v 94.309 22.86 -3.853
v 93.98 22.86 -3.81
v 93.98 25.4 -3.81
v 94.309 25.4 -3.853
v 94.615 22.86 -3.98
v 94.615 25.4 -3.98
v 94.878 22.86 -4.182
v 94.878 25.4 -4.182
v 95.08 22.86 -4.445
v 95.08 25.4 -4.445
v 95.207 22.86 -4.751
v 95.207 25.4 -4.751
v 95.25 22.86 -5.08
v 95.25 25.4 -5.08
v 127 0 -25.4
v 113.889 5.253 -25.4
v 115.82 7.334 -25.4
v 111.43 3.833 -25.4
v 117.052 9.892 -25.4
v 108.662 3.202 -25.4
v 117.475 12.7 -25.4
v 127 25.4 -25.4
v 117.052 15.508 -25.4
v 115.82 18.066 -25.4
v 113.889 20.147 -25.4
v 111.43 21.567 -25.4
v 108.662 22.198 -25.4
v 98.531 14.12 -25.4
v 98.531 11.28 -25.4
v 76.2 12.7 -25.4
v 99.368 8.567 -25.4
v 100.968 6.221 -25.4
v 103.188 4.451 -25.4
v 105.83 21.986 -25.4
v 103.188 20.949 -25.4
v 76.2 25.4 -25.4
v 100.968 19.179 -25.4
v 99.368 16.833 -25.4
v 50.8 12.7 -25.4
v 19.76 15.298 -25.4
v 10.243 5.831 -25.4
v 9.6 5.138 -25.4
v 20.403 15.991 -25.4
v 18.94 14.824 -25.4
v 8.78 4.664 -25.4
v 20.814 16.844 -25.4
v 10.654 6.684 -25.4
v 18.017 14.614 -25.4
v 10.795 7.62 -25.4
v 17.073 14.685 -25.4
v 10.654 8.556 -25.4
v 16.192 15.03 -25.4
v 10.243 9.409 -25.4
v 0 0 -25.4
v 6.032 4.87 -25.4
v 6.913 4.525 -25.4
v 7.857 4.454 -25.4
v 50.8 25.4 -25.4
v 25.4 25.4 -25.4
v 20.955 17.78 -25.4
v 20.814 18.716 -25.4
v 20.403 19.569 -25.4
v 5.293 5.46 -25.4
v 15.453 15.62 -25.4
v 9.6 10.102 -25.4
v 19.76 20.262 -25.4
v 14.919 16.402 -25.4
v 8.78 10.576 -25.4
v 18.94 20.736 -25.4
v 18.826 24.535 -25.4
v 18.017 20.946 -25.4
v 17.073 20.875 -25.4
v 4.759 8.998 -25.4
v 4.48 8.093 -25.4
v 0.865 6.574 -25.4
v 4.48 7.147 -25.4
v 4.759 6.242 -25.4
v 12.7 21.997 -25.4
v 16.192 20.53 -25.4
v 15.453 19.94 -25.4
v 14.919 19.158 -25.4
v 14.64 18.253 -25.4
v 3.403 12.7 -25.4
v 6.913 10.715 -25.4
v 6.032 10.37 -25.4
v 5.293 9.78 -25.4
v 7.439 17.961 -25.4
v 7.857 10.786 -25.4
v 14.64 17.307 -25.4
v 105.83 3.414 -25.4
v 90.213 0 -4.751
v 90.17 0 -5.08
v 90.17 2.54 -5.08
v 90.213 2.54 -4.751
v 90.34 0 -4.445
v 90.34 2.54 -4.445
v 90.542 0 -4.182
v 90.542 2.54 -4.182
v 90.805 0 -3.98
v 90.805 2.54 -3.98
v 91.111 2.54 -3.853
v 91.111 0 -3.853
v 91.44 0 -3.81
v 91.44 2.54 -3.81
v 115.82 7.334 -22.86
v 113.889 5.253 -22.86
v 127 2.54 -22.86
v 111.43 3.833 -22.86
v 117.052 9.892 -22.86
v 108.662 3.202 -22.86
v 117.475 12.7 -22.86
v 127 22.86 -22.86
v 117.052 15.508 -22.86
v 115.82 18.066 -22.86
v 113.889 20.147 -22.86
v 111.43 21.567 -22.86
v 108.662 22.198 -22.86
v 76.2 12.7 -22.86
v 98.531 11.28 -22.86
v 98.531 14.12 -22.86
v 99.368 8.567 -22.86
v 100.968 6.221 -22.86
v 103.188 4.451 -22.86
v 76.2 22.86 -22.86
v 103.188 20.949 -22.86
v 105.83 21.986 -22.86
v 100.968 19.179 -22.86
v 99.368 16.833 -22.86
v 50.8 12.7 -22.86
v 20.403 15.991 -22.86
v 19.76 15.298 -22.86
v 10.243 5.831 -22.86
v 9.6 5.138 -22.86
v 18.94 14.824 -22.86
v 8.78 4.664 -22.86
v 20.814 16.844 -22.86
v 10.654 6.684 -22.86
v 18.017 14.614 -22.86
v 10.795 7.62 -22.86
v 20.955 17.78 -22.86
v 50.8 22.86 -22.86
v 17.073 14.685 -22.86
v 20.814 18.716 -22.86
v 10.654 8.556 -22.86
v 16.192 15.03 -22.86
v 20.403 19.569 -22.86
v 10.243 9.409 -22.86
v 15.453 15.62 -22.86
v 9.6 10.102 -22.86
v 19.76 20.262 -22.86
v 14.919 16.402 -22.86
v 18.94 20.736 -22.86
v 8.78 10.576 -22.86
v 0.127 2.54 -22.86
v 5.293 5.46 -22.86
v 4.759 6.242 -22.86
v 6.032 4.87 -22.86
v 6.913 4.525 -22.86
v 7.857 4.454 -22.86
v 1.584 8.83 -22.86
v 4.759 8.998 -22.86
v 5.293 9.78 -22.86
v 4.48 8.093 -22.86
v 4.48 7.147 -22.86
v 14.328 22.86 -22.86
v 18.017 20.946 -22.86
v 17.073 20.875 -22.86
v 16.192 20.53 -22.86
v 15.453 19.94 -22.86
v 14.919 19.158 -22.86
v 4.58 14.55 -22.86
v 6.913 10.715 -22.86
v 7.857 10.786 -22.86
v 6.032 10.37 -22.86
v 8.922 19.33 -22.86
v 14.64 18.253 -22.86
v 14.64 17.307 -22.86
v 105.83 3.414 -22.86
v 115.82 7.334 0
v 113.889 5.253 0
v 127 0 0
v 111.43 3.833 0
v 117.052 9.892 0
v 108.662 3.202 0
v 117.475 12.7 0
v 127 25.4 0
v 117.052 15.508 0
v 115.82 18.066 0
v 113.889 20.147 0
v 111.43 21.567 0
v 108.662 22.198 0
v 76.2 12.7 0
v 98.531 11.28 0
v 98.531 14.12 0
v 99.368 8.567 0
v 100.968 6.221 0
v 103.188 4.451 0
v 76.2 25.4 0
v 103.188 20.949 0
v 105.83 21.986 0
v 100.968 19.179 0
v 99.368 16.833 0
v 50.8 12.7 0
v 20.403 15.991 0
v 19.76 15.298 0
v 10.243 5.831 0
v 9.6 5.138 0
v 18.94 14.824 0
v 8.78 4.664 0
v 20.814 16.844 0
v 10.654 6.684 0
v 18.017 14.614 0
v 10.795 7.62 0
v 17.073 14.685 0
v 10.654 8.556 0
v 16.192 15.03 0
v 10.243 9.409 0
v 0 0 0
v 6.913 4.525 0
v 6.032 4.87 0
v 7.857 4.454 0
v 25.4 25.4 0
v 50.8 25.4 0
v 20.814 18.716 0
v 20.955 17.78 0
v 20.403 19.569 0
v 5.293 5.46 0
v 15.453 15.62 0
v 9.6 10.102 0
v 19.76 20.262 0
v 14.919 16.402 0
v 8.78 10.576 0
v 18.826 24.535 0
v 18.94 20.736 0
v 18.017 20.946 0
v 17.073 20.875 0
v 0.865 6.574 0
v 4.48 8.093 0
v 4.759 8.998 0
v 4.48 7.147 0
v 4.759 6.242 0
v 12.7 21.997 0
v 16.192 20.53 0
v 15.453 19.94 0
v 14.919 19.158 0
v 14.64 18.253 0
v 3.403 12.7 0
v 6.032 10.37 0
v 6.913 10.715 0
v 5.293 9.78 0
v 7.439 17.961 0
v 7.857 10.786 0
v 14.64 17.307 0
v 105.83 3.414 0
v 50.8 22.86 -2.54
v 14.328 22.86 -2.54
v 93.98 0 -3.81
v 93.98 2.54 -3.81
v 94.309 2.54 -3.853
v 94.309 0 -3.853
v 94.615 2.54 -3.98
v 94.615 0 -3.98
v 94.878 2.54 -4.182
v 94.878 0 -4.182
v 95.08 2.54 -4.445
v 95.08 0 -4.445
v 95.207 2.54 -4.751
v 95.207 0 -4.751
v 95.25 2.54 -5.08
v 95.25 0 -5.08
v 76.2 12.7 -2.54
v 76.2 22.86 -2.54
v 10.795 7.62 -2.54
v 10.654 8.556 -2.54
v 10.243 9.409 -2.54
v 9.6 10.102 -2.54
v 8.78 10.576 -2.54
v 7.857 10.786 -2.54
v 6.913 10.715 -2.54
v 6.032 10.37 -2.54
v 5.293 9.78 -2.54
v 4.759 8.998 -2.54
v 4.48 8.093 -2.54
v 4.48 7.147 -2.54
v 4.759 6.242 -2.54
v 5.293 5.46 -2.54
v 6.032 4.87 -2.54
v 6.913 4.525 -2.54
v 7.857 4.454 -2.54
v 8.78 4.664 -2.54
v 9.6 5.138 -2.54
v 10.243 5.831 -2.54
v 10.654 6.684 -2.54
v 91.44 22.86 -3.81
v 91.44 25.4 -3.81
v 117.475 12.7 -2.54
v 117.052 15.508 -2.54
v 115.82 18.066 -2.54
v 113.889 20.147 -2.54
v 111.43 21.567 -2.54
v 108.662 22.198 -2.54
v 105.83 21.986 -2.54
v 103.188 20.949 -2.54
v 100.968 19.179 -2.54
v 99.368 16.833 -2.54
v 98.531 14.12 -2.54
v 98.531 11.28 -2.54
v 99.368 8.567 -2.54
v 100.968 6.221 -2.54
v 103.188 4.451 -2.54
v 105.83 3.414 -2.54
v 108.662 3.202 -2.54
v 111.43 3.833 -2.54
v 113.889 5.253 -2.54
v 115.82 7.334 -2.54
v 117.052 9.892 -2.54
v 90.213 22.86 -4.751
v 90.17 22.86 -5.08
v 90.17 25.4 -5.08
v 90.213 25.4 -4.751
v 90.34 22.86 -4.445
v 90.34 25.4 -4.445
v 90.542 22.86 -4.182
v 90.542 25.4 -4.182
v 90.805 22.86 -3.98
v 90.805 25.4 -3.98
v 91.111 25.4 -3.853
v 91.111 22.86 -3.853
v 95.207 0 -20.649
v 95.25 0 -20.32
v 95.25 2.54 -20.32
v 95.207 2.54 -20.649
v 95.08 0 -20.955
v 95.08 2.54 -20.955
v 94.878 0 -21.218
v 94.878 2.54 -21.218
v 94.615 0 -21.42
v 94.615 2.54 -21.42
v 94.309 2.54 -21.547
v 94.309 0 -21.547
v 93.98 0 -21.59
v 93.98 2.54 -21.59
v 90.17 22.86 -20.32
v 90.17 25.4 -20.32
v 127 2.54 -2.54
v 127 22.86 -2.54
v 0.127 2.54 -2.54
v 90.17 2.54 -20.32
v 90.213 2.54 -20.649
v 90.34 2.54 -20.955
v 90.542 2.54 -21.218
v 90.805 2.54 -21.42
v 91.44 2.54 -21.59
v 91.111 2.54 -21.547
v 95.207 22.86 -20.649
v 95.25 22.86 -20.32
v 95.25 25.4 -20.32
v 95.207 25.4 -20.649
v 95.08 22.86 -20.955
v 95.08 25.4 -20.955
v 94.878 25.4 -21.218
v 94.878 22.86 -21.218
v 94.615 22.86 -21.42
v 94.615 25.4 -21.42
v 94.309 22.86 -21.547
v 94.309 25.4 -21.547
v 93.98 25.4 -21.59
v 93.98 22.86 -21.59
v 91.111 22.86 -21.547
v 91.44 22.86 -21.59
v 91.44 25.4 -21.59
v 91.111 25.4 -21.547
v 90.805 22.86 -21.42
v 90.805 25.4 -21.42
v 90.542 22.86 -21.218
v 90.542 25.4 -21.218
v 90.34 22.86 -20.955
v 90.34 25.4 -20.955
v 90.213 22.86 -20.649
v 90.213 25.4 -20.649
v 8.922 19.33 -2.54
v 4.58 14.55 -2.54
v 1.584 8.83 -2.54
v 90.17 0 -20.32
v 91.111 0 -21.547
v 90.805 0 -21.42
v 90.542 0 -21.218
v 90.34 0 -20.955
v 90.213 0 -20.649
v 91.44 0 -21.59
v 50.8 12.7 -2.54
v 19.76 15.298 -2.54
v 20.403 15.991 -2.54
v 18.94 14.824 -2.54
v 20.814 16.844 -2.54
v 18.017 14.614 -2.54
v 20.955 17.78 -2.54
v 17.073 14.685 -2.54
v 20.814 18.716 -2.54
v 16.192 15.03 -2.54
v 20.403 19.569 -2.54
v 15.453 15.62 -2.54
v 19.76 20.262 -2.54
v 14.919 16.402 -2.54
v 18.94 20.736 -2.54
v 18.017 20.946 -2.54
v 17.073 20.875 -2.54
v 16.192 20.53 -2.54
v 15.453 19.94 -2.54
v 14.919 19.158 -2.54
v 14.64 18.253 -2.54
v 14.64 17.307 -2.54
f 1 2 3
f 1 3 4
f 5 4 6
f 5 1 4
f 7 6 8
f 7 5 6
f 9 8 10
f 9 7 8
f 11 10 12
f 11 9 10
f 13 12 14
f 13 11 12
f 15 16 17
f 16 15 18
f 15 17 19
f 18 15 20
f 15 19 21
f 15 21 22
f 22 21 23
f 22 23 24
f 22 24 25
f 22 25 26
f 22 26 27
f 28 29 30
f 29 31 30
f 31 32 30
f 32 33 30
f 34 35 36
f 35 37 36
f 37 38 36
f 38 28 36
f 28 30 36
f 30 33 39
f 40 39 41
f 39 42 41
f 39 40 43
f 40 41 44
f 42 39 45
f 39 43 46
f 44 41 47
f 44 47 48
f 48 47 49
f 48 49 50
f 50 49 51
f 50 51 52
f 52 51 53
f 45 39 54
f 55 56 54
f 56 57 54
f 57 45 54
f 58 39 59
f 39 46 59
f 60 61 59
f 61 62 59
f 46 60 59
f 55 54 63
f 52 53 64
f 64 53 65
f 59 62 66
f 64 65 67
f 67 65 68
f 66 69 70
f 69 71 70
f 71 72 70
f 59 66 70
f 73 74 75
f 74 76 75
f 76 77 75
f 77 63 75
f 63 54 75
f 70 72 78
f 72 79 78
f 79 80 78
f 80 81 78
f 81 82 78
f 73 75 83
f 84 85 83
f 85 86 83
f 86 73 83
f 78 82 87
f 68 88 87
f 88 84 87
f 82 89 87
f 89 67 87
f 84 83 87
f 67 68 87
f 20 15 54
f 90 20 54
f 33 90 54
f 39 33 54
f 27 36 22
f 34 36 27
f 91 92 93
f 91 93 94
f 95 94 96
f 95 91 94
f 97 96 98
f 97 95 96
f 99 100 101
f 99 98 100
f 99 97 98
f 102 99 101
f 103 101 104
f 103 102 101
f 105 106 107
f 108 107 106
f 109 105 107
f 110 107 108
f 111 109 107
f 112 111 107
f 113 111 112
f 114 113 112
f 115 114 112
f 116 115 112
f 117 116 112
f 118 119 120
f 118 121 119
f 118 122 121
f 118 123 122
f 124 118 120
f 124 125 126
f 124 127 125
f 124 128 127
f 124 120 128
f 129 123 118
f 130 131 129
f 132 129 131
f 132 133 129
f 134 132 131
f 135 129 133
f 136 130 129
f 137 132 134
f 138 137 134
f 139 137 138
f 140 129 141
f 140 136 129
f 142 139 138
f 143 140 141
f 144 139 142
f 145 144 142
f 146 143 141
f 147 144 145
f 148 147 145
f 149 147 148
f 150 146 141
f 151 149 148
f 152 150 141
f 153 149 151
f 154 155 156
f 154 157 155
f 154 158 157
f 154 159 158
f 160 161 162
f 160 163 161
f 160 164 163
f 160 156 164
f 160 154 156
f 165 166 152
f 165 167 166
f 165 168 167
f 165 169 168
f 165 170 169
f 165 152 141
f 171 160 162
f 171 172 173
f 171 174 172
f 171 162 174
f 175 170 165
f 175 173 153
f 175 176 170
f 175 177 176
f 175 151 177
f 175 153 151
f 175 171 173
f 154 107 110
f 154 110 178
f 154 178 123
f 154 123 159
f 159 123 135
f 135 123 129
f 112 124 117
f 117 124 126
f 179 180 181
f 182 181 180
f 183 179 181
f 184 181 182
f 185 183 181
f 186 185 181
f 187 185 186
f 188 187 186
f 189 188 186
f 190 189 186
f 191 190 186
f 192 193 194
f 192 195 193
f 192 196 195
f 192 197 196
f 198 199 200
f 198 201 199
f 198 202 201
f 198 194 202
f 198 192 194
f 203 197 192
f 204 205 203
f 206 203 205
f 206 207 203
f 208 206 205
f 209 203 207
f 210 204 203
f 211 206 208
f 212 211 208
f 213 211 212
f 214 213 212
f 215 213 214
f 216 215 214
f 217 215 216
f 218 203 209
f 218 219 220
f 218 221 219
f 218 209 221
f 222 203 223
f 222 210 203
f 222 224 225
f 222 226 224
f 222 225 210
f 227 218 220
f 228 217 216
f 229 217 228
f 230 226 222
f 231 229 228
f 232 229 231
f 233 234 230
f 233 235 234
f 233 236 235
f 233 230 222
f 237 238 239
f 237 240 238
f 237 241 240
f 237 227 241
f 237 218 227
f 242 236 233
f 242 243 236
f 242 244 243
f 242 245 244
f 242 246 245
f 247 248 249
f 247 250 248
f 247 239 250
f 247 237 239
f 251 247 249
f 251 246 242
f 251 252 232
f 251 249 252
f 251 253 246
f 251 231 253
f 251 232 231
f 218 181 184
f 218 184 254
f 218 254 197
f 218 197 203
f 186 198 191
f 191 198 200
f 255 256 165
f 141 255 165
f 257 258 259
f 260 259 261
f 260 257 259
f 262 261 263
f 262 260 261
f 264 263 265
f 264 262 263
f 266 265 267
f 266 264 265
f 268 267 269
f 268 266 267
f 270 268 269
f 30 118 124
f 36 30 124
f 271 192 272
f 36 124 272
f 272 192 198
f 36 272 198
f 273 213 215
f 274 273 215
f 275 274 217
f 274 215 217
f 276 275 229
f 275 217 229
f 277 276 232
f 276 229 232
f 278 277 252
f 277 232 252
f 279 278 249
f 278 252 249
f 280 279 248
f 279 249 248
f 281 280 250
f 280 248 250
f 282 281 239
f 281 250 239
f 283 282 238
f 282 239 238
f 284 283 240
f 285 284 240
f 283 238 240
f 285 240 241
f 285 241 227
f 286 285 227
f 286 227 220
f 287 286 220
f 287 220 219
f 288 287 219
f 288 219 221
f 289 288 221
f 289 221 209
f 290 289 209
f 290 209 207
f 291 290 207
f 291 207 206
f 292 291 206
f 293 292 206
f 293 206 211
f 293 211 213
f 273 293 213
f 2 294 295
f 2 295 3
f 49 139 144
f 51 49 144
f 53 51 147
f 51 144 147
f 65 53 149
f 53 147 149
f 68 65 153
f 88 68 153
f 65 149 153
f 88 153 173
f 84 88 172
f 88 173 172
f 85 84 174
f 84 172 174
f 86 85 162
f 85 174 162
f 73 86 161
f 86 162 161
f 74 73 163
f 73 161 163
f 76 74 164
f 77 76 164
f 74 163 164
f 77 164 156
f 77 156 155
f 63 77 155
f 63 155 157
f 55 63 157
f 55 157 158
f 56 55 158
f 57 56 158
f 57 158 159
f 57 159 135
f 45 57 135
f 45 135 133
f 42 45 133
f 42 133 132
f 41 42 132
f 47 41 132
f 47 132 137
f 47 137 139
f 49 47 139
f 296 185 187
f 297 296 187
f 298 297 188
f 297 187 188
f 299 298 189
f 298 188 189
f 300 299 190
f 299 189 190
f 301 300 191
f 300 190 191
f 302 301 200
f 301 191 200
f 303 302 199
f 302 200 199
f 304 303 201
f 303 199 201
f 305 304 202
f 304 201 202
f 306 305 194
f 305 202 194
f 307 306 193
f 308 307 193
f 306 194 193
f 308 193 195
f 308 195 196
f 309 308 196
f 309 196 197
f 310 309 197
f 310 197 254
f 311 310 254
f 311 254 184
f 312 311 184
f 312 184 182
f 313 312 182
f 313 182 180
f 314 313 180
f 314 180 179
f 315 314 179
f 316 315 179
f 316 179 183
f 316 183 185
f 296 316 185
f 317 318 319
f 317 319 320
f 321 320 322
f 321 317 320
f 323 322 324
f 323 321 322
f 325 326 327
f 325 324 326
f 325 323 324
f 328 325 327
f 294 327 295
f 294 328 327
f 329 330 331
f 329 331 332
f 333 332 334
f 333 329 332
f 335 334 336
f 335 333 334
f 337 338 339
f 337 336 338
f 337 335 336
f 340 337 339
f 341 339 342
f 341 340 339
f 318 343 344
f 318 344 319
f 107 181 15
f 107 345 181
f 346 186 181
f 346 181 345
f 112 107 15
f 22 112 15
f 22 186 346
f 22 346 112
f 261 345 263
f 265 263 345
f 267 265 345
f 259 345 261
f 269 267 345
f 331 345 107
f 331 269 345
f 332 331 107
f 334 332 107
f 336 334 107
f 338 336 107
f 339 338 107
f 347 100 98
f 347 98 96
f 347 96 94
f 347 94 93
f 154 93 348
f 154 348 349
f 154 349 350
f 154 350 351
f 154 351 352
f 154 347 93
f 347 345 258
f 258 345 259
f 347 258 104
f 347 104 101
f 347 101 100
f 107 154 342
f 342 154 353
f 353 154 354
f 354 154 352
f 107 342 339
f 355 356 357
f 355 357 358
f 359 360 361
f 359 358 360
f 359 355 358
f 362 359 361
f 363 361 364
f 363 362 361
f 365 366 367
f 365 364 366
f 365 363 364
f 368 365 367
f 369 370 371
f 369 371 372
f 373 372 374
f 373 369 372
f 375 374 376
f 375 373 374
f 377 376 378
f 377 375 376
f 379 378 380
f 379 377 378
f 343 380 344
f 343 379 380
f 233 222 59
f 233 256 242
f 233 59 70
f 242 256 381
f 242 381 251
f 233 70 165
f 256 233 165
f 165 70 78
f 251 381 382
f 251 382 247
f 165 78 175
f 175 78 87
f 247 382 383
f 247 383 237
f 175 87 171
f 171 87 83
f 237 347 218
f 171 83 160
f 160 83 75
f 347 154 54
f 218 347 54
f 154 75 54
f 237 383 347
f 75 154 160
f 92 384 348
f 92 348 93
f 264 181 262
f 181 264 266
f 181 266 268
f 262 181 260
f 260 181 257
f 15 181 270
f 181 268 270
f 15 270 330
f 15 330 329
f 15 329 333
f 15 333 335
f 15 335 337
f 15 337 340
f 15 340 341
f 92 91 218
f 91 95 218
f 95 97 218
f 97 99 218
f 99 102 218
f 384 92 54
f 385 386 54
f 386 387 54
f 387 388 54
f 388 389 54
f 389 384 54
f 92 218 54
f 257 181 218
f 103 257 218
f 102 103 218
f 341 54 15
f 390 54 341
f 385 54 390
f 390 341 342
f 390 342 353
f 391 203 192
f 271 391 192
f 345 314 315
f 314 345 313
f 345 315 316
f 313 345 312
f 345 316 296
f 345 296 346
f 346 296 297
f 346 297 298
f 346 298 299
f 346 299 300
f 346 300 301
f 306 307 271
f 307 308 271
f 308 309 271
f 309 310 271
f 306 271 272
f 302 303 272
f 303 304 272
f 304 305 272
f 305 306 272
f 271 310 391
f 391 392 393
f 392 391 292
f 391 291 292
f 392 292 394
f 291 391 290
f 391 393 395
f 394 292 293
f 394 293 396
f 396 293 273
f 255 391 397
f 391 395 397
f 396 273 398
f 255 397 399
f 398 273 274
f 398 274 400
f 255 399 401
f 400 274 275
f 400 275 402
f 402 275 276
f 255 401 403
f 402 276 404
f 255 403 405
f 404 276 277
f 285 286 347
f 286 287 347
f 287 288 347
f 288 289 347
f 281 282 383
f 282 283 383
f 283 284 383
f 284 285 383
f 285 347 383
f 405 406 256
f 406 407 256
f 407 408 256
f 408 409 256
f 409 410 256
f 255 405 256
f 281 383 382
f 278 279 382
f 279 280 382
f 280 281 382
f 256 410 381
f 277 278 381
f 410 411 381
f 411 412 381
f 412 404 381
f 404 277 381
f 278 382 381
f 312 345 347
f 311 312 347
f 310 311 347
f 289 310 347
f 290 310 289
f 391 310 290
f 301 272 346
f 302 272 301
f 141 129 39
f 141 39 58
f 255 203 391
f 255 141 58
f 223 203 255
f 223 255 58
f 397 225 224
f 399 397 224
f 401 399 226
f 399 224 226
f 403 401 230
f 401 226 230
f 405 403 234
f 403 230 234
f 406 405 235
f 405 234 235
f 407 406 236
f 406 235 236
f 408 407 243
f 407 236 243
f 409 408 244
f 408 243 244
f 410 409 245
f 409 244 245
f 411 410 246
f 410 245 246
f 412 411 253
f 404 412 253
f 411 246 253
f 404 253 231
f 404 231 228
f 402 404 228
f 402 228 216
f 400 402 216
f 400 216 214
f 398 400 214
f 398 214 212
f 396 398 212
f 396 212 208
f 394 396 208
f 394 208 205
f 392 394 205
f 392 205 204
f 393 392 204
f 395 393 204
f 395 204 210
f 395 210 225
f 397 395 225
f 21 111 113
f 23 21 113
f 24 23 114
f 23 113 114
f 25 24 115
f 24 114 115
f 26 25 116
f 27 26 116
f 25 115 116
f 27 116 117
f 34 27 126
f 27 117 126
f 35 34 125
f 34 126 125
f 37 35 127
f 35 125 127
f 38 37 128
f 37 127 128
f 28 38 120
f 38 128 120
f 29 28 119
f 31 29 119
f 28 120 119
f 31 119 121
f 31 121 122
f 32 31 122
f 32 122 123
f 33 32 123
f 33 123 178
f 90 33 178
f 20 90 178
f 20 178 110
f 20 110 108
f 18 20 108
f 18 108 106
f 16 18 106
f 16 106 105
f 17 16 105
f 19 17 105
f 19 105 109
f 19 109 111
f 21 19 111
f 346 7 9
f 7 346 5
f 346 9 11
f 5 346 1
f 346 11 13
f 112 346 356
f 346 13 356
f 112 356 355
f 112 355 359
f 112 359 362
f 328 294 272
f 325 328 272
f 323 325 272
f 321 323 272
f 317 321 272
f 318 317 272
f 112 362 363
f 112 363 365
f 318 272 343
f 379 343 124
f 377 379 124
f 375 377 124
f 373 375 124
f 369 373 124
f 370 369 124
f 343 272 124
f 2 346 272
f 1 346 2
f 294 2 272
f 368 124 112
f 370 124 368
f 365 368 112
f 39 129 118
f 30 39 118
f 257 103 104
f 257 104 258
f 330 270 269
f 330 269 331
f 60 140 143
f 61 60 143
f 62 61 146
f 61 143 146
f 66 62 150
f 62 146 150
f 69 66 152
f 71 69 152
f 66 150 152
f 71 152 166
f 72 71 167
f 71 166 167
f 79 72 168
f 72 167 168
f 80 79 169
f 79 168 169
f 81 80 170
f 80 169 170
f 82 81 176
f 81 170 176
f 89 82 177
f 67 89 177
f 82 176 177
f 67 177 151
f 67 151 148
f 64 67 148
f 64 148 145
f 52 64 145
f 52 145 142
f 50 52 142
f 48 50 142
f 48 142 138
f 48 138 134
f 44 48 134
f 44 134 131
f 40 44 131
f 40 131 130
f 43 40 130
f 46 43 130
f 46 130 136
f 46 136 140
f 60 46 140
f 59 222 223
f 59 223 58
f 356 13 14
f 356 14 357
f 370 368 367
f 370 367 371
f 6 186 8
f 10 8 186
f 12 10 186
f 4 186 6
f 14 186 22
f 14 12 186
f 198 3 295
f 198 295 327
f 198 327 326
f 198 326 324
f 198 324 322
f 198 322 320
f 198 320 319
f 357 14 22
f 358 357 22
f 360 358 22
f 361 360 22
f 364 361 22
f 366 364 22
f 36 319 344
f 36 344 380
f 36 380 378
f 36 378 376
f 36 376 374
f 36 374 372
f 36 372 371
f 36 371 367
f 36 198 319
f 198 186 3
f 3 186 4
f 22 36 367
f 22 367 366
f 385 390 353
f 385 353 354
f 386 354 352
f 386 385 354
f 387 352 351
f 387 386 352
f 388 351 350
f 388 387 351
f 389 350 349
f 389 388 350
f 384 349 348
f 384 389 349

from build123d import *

# Parameters (mm, degrees)
SKETCH1_W           = 25.4
SKETCH1_H           = 25.4
SKETCH1_W_2         = 20.32
SKETCH1_H_2         = 20.32
BOSS_EXTRUDE1_DEPTH = 127
SKETCH2_W           = 25.4
SKETCH2_H           = 12.7
CUT_EXTRUDE1_DEPTH  = 127
FILLET1_R           = 25.4
SKETCH3_R           = 3.175
CUT_EXTRUDE2_DEPTH  = 127
SKETCH4_R           = 9.525
CUT_EXTRUDE3_DEPTH  = 127
CUT_EXTRUDE4_DEPTH  = 127


with BuildPart() as part:
    # Sketch1 → Boss-Extrude1 (new body)
    with BuildSketch(Plane(origin=(0, 0, 0), x_dir=(0, 0, -1), z_dir=(1, 0, 0))):
        with Locations((12.7, 12.7)):
            Rectangle(SKETCH1_W, SKETCH1_H)
        with Locations((12.7, 12.7)):
            Rectangle(SKETCH1_W_2, SKETCH1_H_2, mode=Mode.SUBTRACT)
    extrude(amount=BOSS_EXTRUDE1_DEPTH)

    # Sketch2 → Cut-Extrude1 (cut)
    with BuildSketch(Plane.XY):
        with Locations((63.5, 19.05)):
            Rectangle(SKETCH2_W, SKETCH2_H)
    extrude(amount=-CUT_EXTRUDE1_DEPTH, mode=Mode.SUBTRACT)

    # Fillet1
    # the kernel refuses this fillet: 25.4 mm, written as the material it takes off along each edge
    with BuildSketch(Plane(origin=(0, 25.4, -88.9), x_dir=(0, -1, 0), z_dir=(0, 0, 1))) as fillet1_piece_1:
        with BuildLine():
            CenterArc((FILLET1_R, FILLET1_R), FILLET1_R, 180, 90)
            Line((0, FILLET1_R), (0, 0))
            Line((0, 0), (FILLET1_R, 0))
        make_face()
    extrude(amount=152.4, mode=Mode.SUBTRACT)

    # Sketch3 → Cut-Extrude2 (cut)
    with BuildSketch(Plane.XY):
        with Locations((7.62, 7.62)):
            Circle(SKETCH3_R)
        with Locations((17.78, 17.78)):
            Circle(SKETCH3_R)
    extrude(amount=-CUT_EXTRUDE2_DEPTH, mode=Mode.SUBTRACT)

    # Sketch4 → Cut-Extrude3 (cut)
    with BuildSketch(Plane.XY):
        with Locations((107.95, 12.7)):
            Circle(SKETCH4_R)
    extrude(amount=-CUT_EXTRUDE3_DEPTH, mode=Mode.SUBTRACT)

    # Sketch5 → Cut-Extrude4 (cut)
    with BuildSketch(Plane.XZ):
        with BuildLine():
            Line((91.44, -3.81), (93.98, -3.81))
            ThreePointArc((93.98, -3.81), (94.878025612, -4.181974388), (95.25, -5.08))
            Line((95.25, -5.08), (95.25, -20.32))
            ThreePointArc((95.25, -20.32), (94.878025612, -21.218025612), (93.98, -21.59))
            Line((93.98, -21.59), (91.44, -21.59))
            ThreePointArc((91.44, -21.59), (90.541974388, -21.218025612), (90.17, -20.32))
            Line((90.17, -20.32), (90.17, -5.08))
            ThreePointArc((90.17, -5.08), (90.541974388, -4.181974388), (91.44, -3.81))
        make_face()
    extrude(amount=-CUT_EXTRUDE4_DEPTH, mode=Mode.SUBTRACT)


solid = part.part
